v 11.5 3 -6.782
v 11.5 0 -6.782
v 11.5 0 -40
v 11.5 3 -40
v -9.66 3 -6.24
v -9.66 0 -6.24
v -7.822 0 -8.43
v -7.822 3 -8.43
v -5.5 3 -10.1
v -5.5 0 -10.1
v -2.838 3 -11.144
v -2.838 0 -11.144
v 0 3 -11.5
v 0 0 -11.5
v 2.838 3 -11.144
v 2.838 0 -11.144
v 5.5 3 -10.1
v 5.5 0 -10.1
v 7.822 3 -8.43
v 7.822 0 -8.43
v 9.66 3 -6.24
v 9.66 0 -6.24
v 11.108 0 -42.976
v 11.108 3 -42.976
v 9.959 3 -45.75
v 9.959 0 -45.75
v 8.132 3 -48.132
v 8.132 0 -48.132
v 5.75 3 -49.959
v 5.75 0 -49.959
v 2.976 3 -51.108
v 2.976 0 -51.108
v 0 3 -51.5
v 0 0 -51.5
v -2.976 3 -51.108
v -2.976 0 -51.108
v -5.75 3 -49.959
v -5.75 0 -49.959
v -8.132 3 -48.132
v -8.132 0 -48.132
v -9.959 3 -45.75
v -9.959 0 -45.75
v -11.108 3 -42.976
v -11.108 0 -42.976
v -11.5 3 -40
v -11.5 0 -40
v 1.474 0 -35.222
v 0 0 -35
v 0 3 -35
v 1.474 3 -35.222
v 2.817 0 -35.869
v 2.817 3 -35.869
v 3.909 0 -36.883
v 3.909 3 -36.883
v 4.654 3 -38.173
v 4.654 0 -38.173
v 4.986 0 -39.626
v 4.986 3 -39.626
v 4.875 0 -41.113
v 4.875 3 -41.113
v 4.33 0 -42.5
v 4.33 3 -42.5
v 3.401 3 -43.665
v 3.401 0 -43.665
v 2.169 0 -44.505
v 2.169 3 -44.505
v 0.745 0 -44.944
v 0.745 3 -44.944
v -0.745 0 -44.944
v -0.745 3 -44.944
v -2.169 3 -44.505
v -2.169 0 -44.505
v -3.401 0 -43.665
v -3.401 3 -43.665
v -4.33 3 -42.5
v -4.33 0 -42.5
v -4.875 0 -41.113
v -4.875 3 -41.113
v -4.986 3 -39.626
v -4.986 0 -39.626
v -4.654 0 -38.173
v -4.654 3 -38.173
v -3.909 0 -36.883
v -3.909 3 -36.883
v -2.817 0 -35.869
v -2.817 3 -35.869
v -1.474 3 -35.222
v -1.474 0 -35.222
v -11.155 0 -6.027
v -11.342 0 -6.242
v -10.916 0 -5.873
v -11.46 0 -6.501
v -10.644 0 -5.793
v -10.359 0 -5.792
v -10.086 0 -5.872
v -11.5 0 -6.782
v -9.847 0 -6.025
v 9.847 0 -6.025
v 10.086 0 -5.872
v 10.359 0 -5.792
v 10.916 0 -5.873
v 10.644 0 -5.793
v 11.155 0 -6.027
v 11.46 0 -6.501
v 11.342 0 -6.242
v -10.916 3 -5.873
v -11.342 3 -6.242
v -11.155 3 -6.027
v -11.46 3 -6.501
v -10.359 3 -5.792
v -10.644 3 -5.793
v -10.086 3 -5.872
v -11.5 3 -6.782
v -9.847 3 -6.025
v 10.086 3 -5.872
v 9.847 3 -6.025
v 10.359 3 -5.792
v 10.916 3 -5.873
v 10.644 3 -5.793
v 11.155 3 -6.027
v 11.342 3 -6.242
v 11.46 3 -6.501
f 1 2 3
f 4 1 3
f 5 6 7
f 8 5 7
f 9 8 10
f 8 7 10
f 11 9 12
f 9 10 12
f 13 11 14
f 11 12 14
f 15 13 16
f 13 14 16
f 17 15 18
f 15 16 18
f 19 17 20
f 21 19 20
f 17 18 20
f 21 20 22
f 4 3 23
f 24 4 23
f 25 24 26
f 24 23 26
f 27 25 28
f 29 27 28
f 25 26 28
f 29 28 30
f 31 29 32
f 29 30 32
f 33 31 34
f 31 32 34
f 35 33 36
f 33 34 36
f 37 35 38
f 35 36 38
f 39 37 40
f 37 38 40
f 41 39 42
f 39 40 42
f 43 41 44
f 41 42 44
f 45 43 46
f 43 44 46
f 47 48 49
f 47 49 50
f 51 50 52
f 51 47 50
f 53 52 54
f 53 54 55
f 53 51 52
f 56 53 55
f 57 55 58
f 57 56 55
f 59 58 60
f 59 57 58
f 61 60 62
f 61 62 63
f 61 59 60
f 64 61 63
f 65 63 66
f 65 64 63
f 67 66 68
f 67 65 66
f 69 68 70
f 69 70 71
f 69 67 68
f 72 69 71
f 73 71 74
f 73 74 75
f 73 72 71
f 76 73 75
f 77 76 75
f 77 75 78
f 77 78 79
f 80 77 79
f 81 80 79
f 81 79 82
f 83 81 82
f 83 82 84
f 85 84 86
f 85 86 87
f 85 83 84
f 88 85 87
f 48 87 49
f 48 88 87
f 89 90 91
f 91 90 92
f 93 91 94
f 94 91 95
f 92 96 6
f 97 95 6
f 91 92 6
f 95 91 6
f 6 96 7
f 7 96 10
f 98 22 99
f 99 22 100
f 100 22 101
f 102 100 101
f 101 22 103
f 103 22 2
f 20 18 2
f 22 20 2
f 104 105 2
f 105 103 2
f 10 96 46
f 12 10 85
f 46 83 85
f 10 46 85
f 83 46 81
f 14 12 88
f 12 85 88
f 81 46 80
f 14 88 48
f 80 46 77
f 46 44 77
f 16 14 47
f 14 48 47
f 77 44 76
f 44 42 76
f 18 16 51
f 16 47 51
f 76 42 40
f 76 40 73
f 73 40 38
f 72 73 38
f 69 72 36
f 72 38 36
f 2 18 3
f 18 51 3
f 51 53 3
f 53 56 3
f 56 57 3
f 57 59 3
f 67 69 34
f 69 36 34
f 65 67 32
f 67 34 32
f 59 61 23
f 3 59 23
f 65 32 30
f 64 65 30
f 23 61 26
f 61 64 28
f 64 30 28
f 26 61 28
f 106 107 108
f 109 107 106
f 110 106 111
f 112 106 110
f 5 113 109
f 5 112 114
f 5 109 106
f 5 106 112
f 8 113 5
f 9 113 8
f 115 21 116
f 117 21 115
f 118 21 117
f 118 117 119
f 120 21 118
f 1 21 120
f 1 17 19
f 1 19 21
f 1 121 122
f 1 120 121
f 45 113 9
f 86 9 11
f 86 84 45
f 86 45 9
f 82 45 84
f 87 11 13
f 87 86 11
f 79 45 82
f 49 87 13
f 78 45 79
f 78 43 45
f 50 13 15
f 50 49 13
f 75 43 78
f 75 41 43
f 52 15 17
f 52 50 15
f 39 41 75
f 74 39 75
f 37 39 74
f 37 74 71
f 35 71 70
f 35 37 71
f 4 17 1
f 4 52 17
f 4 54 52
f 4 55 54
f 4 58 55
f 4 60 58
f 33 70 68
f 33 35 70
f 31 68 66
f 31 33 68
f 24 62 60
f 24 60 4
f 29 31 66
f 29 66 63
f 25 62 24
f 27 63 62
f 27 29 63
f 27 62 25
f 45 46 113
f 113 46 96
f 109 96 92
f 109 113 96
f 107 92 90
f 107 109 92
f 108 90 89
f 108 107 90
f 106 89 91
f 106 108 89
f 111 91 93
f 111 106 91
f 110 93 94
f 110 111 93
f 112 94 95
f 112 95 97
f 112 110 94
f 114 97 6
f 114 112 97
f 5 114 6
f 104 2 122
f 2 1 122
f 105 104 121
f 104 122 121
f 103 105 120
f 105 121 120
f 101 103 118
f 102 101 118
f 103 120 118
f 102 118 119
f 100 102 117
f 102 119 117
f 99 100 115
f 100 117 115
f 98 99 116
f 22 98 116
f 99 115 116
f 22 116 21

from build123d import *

# Parameters (mm, degrees)
SKETCH1_R           = 11.500000000000005
SKETCH1_R_2         = 5
BOSS_EXTRUDE1_DEPTH = 3
FILLET1_R           = 1


with BuildPart() as part:
    # Sketch1 → Boss-Extrude1 (new body)
    # profile 1 of 2: a face of its own
    with BuildSketch(Plane(origin=(0, 0, 0), x_dir=(1, 0, 0), z_dir=(0, 1, 0))):
        with BuildLine():
            ThreePointArc((11.500000000000005, 40), (-2.11e-15, 28.499999999999993), (-11.500000000000005, 40))
            Line((-11.500000000000002, 40), (-11.5, 0))
            ThreePointArc((-11.5, 1.41e-15), (7e-16, 11.5), (11.5, 0))
            Line((11.5, 0), (11.500000000000002, 40))
        make_face()
    # profile 2 of 2: a face of its own
    with BuildSketch(Plane(origin=(0, 0, 0), x_dir=(1, 0, 0), z_dir=(0, 1, 0))):
        with Locations((0, 40)):
            Circle(SKETCH1_R)
        with Locations(Location((0, 40, 0), (0, 0, 270))):
            Circle(SKETCH1_R_2, mode=Mode.SUBTRACT)
    extrude(amount=BOSS_EXTRUDE1_DEPTH)

    # Fillet1
    fillet1_edges = [part.edges().sort_by_distance(p)[0] for p in [
        (11.5, 1.5, -1.22e-15),
        (-11.5, 1.5, -7e-16),
    ]]
    fillet(fillet1_edges, radius=FILLET1_R)


solid = part.part
